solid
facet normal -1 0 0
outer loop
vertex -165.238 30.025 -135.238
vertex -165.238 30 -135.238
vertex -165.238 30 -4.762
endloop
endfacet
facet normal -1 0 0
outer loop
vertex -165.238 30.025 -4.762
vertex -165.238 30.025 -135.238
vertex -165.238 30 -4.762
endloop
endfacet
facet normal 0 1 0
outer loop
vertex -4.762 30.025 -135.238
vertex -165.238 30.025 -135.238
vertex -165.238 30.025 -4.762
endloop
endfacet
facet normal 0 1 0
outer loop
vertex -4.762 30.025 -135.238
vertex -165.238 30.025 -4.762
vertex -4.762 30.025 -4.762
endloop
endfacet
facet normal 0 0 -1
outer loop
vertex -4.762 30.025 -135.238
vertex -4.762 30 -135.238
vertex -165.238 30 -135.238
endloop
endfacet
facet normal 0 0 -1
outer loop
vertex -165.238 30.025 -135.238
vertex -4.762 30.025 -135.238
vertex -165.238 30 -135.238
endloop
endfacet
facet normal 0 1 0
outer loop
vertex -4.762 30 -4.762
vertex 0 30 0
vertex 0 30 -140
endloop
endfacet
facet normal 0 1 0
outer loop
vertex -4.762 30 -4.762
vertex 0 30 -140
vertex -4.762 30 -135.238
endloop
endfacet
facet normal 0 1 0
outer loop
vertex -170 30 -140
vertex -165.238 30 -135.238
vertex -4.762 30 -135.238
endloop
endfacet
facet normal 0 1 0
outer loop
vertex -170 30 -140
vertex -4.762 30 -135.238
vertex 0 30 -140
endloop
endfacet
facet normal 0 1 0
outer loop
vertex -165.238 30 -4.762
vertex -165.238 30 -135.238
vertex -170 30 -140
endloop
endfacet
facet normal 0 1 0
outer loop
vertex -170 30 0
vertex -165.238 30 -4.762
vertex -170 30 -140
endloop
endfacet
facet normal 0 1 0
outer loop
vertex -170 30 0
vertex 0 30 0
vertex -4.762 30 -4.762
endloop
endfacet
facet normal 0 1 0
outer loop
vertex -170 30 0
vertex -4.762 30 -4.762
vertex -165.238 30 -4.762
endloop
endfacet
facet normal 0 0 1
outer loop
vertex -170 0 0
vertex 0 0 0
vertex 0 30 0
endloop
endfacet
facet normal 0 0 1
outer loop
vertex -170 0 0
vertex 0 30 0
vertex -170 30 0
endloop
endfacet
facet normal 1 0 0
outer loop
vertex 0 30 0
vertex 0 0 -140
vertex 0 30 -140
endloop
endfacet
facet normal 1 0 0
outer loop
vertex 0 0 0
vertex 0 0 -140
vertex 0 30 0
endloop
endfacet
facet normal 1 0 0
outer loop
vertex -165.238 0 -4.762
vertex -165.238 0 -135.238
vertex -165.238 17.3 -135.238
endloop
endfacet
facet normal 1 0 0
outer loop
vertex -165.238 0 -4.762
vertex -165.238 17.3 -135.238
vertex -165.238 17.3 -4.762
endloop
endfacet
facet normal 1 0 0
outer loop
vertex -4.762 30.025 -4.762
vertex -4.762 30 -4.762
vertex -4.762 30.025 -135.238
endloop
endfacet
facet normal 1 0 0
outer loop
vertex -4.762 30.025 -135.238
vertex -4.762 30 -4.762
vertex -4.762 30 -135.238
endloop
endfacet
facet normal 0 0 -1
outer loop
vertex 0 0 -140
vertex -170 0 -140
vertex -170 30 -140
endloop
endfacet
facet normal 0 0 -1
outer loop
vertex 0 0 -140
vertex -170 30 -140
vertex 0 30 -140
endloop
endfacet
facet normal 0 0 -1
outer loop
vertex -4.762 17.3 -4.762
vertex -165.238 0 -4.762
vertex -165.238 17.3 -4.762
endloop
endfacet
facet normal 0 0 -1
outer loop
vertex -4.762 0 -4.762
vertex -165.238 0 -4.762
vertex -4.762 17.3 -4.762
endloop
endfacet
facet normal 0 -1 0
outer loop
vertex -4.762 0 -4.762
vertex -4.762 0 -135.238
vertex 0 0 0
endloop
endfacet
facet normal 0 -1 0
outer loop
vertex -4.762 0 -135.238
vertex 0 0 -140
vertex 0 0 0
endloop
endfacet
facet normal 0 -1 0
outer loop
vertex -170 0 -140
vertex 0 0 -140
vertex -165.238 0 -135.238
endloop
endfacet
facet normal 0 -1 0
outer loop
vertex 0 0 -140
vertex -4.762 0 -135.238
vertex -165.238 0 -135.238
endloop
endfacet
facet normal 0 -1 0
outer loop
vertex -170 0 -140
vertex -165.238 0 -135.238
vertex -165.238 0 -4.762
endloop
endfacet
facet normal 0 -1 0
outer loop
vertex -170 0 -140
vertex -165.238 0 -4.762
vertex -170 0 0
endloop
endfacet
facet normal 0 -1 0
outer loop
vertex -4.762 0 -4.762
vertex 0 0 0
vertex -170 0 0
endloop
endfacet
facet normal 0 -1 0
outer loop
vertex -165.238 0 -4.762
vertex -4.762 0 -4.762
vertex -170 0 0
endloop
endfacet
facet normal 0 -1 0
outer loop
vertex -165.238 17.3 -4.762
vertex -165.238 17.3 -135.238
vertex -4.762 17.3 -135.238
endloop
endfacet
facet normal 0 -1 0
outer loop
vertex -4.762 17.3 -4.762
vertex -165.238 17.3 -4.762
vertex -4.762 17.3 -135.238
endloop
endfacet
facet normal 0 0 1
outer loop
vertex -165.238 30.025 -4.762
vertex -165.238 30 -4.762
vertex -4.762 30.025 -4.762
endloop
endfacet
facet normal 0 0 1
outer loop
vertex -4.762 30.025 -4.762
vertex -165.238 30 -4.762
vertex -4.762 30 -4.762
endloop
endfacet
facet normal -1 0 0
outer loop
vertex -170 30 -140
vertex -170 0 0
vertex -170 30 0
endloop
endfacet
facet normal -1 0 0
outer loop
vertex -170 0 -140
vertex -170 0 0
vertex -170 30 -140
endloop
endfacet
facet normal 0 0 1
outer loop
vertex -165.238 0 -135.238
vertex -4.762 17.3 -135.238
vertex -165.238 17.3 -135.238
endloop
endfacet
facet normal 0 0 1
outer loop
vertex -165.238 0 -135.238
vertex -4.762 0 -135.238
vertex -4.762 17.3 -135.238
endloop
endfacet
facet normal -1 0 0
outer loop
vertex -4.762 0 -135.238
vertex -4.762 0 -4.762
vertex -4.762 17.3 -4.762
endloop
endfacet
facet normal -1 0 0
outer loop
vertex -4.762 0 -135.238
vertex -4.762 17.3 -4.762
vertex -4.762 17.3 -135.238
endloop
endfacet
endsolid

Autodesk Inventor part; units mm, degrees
ref_plane "YZ Plane" through (0, 0, 0) normal (1, 0, 0) x (0, 1, 0)
ref_plane "XZ Plane" through (0, 0, 0) normal (0, 1, 0) x (-1, 0, 0)
ref_plane "XY Plane" through (0, 0, 0) normal (0, 0, 1) x (1, 0, 0)
sketch "Sketch1" plane through (0, 0, 0) normal (0, 1, 0) x (-1, 0, 0)
  line L0 (0, 0) -> (170, 0)
  line L1 (170, 0) -> (170, -140)
  line L2 (170, -140) -> (0, -140)
  line L3 (0, -140) -> (0, 0)
  line L4 (165.2375, -4.7625) -> (4.7625, -4.7625)
  line L5 (4.7625, -4.7625) -> (4.7625, -135.2375)
  line L6 (4.7625, -135.2375) -> (165.2375, -135.2375)
  line L7 (165.2375, -135.2375) -> (165.2375, -4.7625)
  dimension "d0" = 170
  dimension "d1" = 140
  dimension "d2" = 4.7625
  dimension "d3" = 4.7625
  dimension "d4" = 4.7625
  dimension "d5" = 4.7625
  dimension "d6" = 4.7625
extrude "Extrusion1" add sketch "Sketch1" along normal blind 30
sketch "Sketch2" plane through (0, 30, 0) normal (0, 1, 0) x (1, 0, 0)
  line L0 (-4.7625, 4.7625) -> (-165.2375, 4.7625) projected
  line L1 (-165.2375, 4.7625) -> (-4.7625, 4.7625)
  line L2 (-4.7625, 4.7625) -> (-4.7625, 135.2375)
  line L3 (-4.7625, 135.2375) -> (-165.2375, 135.2375)
  line L4 (-165.2375, 135.2375) -> (-165.2375, 4.7625)
  point P0 (0, 0)
extrude "Extrusion2" add sketch "Sketch2" against normal blind 12.7
sketch "Sketch3" plane through (0, 30, 0) normal (0, 1, 0) x (1, 0, 0)
  line L0 (-165.2375, 135.2375) -> (-165.2375, 4.7625) projected
  line L1 (-4.7625, 4.7625) -> (-4.7625, 135.2375) projected
  line L2 (-165.2375, 4.7625) -> (-4.7625, 4.7625)
  line L3 (-4.7625, 4.7625) -> (-4.7625, 135.2375)
  line L4 (-4.7625, 135.2375) -> (-165.2375, 135.2375)
  line L5 (-165.2375, 135.2375) -> (-165.2375, 4.7625)
  point P0 (0, 0)
extrude "Extrusion3" add sketch "Sketch3" along normal blind 0.0254
properties part number "OpticalDeviceLookThroughPart" material "Glass"
